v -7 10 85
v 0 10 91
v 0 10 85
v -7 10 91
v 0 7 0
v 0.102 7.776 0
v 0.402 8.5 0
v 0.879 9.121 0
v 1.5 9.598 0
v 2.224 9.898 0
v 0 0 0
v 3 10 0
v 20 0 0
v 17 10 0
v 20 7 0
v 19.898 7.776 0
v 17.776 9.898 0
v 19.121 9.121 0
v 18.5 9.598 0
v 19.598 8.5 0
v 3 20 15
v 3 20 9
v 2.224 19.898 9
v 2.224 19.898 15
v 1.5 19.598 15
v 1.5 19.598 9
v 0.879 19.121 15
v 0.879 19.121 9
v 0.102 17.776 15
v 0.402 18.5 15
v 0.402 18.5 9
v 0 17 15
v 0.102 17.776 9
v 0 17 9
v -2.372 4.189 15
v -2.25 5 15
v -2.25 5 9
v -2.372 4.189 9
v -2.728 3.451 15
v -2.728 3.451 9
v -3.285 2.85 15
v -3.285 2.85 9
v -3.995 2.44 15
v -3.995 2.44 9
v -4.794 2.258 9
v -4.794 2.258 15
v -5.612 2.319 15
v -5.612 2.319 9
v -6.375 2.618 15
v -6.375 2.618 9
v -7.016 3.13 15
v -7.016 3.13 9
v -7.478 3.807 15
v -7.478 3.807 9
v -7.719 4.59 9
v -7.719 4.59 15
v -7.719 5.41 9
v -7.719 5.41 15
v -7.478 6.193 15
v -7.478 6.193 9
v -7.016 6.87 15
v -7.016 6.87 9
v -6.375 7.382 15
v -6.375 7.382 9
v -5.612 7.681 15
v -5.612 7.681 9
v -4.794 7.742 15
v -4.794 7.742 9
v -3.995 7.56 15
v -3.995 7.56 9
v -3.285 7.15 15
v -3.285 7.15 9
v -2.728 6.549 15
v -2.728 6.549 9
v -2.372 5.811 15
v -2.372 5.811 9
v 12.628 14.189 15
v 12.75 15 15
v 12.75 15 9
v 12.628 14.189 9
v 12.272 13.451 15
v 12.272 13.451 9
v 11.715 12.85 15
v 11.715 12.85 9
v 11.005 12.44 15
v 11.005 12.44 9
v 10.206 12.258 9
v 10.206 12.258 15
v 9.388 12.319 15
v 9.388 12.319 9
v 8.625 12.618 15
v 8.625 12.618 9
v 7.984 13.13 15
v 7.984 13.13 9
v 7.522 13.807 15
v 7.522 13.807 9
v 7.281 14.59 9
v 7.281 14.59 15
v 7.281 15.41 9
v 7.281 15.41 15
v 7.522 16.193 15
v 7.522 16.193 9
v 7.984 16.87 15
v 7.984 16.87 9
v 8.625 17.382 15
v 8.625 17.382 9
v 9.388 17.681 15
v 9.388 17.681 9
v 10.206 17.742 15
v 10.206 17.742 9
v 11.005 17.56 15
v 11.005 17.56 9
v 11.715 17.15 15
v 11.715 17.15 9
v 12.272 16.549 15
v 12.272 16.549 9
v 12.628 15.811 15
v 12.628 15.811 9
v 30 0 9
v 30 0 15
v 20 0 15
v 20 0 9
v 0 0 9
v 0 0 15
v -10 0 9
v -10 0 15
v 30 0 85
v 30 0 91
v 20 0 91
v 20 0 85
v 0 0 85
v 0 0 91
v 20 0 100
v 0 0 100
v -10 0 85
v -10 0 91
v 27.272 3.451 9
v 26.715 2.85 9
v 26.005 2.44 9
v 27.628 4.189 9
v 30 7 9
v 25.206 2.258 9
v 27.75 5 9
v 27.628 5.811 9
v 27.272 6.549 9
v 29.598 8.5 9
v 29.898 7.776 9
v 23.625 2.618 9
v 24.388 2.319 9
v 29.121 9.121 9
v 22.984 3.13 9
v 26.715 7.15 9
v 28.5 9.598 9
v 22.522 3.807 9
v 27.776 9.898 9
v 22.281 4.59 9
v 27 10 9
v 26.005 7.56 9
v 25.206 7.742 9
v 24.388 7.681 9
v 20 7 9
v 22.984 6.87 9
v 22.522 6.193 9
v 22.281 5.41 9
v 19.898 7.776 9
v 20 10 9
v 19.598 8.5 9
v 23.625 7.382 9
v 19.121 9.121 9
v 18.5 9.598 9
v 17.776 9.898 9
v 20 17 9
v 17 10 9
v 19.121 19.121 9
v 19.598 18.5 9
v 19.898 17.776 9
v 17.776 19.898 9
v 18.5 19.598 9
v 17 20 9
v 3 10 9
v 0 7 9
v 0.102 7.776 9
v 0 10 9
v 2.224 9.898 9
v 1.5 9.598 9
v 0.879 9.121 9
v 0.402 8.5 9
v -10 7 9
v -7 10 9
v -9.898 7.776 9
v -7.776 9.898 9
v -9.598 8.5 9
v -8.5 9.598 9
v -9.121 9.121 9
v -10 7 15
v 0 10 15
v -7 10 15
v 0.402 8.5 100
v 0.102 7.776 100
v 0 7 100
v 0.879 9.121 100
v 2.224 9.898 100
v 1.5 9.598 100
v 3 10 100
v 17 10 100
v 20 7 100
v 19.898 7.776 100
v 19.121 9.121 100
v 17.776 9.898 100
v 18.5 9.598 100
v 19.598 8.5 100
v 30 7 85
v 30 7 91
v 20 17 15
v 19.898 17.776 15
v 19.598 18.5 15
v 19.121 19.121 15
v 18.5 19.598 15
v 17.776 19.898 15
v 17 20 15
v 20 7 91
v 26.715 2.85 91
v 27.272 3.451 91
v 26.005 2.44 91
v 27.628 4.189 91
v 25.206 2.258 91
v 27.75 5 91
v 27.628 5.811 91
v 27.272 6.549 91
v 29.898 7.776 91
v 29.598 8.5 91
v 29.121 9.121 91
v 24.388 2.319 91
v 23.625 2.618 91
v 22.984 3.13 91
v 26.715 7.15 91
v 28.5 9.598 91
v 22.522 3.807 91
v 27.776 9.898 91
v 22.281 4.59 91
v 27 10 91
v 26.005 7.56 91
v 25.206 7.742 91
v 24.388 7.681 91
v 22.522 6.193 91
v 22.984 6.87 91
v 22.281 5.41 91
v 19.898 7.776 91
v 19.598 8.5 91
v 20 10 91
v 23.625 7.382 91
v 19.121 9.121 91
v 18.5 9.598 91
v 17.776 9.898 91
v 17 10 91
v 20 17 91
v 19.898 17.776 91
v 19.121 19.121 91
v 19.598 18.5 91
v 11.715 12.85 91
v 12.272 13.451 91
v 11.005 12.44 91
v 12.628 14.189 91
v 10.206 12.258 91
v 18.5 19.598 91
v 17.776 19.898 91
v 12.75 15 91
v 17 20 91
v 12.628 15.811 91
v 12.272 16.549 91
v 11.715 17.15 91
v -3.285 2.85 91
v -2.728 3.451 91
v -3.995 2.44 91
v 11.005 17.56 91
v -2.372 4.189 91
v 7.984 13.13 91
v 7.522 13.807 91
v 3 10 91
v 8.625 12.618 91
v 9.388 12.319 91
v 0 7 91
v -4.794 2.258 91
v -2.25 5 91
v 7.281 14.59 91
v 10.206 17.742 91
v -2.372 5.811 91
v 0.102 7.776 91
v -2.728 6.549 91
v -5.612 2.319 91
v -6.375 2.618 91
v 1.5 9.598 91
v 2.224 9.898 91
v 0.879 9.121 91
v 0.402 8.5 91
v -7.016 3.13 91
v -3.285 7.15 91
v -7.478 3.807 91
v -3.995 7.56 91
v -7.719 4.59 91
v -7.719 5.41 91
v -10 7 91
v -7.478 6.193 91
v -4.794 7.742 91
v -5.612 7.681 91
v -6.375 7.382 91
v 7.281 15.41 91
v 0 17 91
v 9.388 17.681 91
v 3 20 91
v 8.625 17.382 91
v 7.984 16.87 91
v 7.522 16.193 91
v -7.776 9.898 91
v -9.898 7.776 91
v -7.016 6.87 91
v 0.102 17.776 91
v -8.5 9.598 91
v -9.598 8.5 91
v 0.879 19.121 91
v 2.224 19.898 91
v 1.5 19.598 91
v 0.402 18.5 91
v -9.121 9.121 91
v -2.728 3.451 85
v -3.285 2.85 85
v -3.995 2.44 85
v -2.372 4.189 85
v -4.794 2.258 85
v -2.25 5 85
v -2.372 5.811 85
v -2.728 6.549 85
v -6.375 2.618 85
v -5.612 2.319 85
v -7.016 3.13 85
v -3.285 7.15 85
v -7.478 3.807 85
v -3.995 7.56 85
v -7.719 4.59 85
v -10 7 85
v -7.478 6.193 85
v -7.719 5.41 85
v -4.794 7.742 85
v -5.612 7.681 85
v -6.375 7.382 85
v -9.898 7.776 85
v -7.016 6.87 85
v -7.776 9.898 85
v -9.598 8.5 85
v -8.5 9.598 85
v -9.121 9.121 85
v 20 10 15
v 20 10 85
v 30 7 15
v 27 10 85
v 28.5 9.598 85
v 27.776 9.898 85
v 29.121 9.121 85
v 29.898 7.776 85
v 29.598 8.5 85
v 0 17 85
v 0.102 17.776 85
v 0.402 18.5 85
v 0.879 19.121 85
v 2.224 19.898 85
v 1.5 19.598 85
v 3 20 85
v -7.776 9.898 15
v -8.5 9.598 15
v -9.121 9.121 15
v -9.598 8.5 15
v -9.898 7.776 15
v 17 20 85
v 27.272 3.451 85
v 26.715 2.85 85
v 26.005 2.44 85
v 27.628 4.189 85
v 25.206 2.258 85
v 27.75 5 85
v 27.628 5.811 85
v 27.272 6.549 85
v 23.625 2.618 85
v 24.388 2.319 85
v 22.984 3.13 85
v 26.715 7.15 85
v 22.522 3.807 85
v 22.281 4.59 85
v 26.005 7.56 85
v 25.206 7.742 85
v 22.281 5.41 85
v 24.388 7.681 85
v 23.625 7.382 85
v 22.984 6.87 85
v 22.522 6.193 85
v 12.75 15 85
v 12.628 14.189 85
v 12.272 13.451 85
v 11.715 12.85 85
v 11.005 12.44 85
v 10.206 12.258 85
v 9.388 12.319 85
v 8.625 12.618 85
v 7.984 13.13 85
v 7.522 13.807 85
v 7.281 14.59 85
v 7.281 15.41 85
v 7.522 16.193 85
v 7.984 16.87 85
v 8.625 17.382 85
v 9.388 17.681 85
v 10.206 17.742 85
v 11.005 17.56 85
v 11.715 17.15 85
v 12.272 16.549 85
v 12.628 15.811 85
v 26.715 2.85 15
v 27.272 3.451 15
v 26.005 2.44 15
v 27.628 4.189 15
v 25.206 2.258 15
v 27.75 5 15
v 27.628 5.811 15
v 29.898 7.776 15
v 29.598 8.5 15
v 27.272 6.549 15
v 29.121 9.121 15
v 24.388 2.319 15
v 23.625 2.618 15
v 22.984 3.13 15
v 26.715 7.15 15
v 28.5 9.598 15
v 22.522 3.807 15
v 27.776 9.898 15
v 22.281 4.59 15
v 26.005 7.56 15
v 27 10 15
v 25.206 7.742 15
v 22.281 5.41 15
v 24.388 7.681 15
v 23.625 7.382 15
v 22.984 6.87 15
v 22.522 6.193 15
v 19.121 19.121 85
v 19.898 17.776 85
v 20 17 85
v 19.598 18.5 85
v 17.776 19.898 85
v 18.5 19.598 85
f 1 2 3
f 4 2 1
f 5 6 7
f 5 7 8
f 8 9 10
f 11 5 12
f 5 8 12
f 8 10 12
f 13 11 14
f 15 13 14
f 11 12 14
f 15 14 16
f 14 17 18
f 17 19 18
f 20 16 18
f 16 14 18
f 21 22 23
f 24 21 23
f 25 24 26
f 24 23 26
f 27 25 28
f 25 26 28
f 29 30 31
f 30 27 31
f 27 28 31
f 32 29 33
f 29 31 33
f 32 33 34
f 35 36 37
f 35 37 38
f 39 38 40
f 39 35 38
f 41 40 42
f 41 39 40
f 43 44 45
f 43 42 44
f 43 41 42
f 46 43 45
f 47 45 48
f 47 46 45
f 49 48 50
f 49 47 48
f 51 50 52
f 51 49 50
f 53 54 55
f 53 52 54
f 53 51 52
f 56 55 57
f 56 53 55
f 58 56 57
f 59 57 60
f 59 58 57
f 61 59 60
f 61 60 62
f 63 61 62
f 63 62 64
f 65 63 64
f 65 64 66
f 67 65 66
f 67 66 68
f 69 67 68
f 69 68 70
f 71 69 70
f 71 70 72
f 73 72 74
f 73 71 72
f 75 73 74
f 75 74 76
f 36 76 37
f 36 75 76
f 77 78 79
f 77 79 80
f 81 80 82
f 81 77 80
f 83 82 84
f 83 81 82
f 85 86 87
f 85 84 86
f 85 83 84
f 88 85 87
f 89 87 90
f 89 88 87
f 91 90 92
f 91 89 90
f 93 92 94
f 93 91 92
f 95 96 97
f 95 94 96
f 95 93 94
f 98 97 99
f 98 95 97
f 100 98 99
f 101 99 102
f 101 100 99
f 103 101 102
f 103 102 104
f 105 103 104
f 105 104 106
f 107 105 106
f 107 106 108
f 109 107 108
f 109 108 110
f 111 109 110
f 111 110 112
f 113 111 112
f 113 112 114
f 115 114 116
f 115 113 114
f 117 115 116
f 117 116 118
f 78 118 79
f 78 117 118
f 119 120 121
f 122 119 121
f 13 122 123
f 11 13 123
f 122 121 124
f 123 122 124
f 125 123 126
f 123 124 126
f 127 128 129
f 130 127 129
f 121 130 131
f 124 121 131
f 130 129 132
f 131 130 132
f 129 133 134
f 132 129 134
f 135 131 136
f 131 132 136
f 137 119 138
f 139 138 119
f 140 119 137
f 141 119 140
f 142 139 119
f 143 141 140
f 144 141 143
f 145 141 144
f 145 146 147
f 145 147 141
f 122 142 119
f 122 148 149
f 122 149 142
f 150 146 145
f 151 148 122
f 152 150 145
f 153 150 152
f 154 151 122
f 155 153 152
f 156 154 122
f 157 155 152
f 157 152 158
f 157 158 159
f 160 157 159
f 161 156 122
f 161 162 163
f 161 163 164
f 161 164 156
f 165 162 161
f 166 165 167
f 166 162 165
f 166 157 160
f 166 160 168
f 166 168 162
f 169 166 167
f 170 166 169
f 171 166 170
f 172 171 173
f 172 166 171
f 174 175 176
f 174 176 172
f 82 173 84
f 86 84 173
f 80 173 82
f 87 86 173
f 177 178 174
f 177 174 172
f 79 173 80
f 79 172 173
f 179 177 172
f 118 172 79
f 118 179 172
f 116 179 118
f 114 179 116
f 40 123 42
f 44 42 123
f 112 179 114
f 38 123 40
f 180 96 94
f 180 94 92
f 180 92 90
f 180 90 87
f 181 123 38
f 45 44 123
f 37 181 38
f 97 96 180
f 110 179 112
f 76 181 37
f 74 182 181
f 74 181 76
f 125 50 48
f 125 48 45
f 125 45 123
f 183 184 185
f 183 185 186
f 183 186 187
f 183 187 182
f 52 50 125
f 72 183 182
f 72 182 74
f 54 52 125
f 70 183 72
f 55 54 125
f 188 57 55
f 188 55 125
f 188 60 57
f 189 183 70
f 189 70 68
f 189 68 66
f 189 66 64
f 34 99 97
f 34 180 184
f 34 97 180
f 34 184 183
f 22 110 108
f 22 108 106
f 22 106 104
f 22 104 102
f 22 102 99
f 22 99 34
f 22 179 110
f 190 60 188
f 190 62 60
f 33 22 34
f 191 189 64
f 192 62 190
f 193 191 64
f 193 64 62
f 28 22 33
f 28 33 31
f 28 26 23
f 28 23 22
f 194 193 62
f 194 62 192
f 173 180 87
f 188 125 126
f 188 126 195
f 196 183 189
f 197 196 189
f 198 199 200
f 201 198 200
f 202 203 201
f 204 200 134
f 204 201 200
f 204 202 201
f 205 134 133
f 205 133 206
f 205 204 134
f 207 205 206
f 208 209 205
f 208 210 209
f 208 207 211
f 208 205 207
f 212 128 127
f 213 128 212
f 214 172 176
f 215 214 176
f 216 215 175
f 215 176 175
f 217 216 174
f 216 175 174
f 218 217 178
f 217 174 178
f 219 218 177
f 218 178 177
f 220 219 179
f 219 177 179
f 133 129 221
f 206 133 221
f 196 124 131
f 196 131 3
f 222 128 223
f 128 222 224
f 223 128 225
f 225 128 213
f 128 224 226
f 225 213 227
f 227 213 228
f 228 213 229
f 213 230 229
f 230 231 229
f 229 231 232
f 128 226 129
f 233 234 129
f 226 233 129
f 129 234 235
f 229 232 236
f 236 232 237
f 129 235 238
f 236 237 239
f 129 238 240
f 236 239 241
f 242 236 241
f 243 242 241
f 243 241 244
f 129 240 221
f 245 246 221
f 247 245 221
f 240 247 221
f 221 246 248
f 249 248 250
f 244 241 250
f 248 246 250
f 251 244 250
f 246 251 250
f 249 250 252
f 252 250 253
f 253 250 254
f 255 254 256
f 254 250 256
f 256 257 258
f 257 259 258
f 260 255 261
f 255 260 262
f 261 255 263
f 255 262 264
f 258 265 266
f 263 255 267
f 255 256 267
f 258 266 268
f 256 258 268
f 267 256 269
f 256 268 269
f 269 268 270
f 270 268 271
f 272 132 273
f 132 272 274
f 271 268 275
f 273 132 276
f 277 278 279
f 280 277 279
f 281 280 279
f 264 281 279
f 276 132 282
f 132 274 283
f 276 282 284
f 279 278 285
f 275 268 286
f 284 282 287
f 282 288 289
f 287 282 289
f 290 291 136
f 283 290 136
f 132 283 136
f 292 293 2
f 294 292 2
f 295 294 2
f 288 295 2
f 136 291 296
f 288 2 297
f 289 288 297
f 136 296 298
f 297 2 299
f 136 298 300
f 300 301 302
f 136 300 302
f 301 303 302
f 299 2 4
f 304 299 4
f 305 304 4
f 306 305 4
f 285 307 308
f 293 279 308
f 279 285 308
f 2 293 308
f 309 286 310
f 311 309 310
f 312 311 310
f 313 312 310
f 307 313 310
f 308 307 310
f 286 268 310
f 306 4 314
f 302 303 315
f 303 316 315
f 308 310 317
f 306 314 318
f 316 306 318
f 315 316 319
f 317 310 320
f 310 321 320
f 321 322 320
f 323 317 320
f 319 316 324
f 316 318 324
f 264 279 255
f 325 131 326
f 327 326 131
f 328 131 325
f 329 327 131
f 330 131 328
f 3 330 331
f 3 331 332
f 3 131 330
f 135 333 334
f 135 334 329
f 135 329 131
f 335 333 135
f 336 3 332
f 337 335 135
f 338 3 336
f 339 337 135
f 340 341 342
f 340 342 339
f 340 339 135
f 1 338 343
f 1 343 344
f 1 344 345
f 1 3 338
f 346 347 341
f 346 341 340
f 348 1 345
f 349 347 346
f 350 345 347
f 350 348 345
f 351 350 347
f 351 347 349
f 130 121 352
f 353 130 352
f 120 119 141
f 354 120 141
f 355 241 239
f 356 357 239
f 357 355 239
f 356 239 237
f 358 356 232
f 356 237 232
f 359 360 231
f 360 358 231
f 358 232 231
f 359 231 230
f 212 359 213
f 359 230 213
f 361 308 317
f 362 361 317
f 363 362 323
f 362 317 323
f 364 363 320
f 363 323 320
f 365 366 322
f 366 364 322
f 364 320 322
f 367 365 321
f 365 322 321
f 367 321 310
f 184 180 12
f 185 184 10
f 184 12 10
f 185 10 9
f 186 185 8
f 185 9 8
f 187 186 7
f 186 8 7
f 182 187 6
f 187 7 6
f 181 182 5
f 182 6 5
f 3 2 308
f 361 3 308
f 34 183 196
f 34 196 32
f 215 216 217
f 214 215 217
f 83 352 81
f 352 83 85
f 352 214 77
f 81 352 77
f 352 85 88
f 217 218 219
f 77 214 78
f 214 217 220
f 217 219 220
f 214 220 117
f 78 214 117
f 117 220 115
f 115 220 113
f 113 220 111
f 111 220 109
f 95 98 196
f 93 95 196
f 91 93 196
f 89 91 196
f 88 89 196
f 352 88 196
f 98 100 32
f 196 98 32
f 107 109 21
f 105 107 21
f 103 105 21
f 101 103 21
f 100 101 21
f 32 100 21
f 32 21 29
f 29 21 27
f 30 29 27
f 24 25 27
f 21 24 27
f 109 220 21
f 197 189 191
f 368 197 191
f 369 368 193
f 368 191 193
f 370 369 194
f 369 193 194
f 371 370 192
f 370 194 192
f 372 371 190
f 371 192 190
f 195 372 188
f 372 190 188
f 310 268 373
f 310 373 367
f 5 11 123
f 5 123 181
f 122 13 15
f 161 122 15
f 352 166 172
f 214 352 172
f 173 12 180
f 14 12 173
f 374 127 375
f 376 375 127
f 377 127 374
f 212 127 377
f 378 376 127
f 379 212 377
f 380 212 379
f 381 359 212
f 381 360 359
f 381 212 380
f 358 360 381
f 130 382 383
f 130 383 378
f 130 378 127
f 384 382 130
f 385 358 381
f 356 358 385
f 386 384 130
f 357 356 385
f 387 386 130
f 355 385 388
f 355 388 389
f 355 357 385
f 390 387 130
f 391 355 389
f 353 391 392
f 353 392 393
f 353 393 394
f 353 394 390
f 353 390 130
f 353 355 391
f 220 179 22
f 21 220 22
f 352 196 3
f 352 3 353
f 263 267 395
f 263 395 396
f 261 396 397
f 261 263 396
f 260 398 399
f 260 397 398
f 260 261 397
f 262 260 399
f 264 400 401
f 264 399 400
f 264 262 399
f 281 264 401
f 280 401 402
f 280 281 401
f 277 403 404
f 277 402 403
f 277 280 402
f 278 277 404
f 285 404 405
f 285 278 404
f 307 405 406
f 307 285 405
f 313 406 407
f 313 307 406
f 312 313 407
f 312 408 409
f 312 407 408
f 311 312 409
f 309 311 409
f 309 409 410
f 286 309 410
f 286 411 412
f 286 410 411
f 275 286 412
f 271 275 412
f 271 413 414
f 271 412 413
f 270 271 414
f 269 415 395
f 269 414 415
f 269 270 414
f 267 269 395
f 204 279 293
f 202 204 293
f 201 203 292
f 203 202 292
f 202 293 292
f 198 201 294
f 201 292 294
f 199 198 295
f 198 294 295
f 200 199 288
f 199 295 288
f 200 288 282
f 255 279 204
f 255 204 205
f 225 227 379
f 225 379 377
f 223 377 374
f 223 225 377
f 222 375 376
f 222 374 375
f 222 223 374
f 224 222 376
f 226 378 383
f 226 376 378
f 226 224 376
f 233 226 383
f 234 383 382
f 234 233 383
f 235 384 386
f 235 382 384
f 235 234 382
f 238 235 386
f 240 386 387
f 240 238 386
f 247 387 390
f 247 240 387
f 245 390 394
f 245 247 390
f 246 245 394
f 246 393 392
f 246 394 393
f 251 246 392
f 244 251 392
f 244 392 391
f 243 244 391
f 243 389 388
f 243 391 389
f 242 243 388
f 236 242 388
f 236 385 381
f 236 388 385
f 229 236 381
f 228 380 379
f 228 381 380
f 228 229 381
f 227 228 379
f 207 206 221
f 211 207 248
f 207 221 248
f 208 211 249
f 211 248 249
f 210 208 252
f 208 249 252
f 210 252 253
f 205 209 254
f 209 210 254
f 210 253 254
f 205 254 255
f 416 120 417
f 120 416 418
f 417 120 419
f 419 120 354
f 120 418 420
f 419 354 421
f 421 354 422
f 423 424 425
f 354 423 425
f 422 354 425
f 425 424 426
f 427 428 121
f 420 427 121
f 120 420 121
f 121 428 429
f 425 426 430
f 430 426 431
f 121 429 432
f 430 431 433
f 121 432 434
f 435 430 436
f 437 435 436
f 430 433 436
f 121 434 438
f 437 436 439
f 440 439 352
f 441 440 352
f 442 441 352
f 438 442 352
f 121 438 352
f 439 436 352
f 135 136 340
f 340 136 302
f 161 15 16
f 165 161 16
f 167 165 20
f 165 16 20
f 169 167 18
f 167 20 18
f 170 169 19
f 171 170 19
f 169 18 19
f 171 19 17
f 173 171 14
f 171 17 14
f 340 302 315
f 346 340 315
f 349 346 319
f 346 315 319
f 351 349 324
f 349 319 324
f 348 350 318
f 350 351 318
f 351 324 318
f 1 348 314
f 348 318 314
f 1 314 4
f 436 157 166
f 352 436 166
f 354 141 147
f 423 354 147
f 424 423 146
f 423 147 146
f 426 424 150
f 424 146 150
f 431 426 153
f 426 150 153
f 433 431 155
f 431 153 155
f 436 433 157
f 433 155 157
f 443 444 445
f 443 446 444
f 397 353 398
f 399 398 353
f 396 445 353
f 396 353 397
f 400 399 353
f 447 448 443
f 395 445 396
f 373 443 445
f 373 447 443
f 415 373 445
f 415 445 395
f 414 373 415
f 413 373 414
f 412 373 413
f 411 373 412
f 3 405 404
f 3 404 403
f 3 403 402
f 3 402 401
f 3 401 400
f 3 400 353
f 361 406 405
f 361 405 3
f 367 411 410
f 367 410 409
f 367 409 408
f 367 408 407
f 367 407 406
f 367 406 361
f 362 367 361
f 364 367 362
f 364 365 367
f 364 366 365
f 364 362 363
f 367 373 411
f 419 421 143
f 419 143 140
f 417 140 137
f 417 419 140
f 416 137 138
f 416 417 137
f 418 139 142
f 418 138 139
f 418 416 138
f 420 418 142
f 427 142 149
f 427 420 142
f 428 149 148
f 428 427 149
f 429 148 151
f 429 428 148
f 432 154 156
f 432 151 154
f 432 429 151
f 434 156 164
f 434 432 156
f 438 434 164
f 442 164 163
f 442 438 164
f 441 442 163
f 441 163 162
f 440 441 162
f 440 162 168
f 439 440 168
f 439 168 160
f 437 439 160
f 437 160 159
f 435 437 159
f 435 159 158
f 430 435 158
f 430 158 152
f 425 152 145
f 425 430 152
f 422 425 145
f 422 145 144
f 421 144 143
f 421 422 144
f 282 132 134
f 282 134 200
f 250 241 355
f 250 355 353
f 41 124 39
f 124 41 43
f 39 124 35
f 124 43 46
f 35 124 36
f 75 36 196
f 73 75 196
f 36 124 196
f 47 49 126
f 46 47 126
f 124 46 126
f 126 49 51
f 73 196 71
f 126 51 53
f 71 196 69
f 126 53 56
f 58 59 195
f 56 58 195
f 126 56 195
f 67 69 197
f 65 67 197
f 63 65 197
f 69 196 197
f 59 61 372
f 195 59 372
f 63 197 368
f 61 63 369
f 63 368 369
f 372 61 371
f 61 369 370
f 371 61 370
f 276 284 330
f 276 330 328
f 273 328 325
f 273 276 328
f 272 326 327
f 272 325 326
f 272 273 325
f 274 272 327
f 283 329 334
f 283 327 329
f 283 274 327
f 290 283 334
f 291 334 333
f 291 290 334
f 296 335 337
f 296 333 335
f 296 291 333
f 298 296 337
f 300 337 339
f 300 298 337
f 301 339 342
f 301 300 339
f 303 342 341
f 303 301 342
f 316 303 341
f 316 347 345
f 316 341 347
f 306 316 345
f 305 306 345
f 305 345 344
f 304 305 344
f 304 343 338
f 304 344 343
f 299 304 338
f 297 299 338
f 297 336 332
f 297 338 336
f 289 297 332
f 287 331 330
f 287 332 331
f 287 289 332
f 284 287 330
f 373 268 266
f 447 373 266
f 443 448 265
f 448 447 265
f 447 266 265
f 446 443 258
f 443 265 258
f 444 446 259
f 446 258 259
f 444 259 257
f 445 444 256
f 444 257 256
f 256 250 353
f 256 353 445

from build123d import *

# Parameters (mm, degrees)
SKETCH_1_W               = 20
SKETCH_1_H               = 10
EXTRUDE_1_DEPTH          = 100
EXTRUDE_START            = -9
SKETCH_2_W               = 10
SKETCH_2_H               = 10
SKETCH_2_W_2             = 20
EXTRUDE_2_DEPTH          = 6
CUT_EXTRUDE_1_DEPTH      = 98.88258272
CUT_EXTRUDE_1_DEPTH_BACK = 98.88258272
SKETCH_3_R               = 2.75
FILLET_1_R               = 3


with BuildPart() as part:
    # 草图1 → 凸台-拉伸1 (new body)
    with BuildSketch(Plane.XY):
        with Locations((10, 5)):
            Rectangle(SKETCH_1_W, SKETCH_1_H)
    extrude(amount=EXTRUDE_1_DEPTH)

    # 草图2 → 凸台-拉伸2 (add)
    with BuildSketch(Plane(origin=(0, 0, 0), x_dir=(-1, 0, 0), z_dir=(0, 0, -1)).offset(EXTRUDE_START)):
        with Locations((-25, 5)):
            Rectangle(SKETCH_2_W, SKETCH_2_H)
        with Locations((-10, 15)):
            Rectangle(SKETCH_2_W_2, SKETCH_2_H)
        with Locations((5, 5)):
            Rectangle(SKETCH_2_W, SKETCH_2_H)
    extrude_2 = extrude(amount=-EXTRUDE_2_DEPTH)

    # 镜向1: 凸台-拉伸2 across plane
    add(extrude_2.mirror(Plane(origin=(0, 0, 50), x_dir=(1, 0, 0), z_dir=(0, 0, -1))))

    # 草图3 → 切除-拉伸1 (cut, two sides: drawn at the far end of the back side and taken through both)
    with BuildSketch(Plane(origin=(0, 0, 9), x_dir=(-1, 0, 0), z_dir=(0, 0, -1)).offset(-CUT_EXTRUDE_1_DEPTH_BACK)):
        with Locations(Location((5, 5, 0), (0, 0, 180))):
            Circle(SKETCH_3_R)
        with Locations(Location((-10, 15, 0), (0, 0, 180))):
            Circle(SKETCH_3_R)
        with Locations(Location((-25, 5, 0), (0, 0, 180))):
            Circle(SKETCH_3_R)
    extrude(amount=CUT_EXTRUDE_1_DEPTH + CUT_EXTRUDE_1_DEPTH_BACK, mode=Mode.SUBTRACT)

    # 圆角1
    # the kernel refuses this fillet: 3 mm, written as the material it takes off along each edge
    with BuildSketch(Plane(origin=(0, 10, -7.5), x_dir=(0, -1, 0), z_dir=(0, 0, 1)), Plane(origin=(0, 10, 91), x_dir=(0, -1, 0), z_dir=(0, 0, 1))) as fillet_1_piece_1:
        with BuildLine():
            CenterArc((FILLET_1_R, FILLET_1_R), FILLET_1_R, 180, 90)
            Line((0, FILLET_1_R), (0, 0))
            Line((0, 0), (FILLET_1_R, 0))
        make_face()
    extrude(amount=16.5, mode=Mode.SUBTRACT)
    with BuildSketch(Plane(origin=(20, 10, -7.5), x_dir=(0, -1, 0), z_dir=(0, 0, 1)), Plane(origin=(20, 10, 91), x_dir=(0, -1, 0), z_dir=(0, 0, 1))) as fillet_1_piece_2:
        with BuildLine():
            CenterArc((FILLET_1_R, -FILLET_1_R), FILLET_1_R, 90, 90)
            Line((0, -FILLET_1_R), (0, 0))
            Line((0, 0), (FILLET_1_R, 0))
        make_face()
    extrude(amount=16.5, mode=Mode.SUBTRACT)
    with BuildSketch(Plane(origin=(20, 20, 1.5), x_dir=(0, -1, 0), z_dir=(0, 0, 1)), Plane(origin=(30, 10, 1.5), x_dir=(0, -1, 0), z_dir=(0, 0, 1)), Plane(origin=(0, 20, 98.5), x_dir=(0, -1, 0), z_dir=(0, 0, -1)), Plane(origin=(-10, 10, 98.5), x_dir=(0, -1, 0), z_dir=(0, 0, -1))) as fillet_1_piece_3:
        with BuildLine():
            CenterArc((FILLET_1_R, -FILLET_1_R), FILLET_1_R, 90, 90)
            Line((0, -FILLET_1_R), (0, 0))
            Line((0, 0), (FILLET_1_R, 0))
        make_face()
    extrude(amount=21, mode=Mode.SUBTRACT)
    with BuildSketch(Plane(origin=(0, 20, 1.5), x_dir=(0, -1, 0), z_dir=(0, 0, 1)), Plane(origin=(-10, 10, 1.5), x_dir=(0, -1, 0), z_dir=(0, 0, 1)), Plane(origin=(30, 10, 98.5), x_dir=(0, -1, 0), z_dir=(0, 0, -1)), Plane(origin=(20, 20, 98.5), x_dir=(0, -1, 0), z_dir=(0, 0, -1))) as fillet_1_piece_4:
        with BuildLine():
            CenterArc((FILLET_1_R, FILLET_1_R), FILLET_1_R, 180, 90)
            Line((0, FILLET_1_R), (0, 0))
            Line((0, 0), (FILLET_1_R, 0))
        make_face()
    extrude(amount=21, mode=Mode.SUBTRACT)


solid = part.part
